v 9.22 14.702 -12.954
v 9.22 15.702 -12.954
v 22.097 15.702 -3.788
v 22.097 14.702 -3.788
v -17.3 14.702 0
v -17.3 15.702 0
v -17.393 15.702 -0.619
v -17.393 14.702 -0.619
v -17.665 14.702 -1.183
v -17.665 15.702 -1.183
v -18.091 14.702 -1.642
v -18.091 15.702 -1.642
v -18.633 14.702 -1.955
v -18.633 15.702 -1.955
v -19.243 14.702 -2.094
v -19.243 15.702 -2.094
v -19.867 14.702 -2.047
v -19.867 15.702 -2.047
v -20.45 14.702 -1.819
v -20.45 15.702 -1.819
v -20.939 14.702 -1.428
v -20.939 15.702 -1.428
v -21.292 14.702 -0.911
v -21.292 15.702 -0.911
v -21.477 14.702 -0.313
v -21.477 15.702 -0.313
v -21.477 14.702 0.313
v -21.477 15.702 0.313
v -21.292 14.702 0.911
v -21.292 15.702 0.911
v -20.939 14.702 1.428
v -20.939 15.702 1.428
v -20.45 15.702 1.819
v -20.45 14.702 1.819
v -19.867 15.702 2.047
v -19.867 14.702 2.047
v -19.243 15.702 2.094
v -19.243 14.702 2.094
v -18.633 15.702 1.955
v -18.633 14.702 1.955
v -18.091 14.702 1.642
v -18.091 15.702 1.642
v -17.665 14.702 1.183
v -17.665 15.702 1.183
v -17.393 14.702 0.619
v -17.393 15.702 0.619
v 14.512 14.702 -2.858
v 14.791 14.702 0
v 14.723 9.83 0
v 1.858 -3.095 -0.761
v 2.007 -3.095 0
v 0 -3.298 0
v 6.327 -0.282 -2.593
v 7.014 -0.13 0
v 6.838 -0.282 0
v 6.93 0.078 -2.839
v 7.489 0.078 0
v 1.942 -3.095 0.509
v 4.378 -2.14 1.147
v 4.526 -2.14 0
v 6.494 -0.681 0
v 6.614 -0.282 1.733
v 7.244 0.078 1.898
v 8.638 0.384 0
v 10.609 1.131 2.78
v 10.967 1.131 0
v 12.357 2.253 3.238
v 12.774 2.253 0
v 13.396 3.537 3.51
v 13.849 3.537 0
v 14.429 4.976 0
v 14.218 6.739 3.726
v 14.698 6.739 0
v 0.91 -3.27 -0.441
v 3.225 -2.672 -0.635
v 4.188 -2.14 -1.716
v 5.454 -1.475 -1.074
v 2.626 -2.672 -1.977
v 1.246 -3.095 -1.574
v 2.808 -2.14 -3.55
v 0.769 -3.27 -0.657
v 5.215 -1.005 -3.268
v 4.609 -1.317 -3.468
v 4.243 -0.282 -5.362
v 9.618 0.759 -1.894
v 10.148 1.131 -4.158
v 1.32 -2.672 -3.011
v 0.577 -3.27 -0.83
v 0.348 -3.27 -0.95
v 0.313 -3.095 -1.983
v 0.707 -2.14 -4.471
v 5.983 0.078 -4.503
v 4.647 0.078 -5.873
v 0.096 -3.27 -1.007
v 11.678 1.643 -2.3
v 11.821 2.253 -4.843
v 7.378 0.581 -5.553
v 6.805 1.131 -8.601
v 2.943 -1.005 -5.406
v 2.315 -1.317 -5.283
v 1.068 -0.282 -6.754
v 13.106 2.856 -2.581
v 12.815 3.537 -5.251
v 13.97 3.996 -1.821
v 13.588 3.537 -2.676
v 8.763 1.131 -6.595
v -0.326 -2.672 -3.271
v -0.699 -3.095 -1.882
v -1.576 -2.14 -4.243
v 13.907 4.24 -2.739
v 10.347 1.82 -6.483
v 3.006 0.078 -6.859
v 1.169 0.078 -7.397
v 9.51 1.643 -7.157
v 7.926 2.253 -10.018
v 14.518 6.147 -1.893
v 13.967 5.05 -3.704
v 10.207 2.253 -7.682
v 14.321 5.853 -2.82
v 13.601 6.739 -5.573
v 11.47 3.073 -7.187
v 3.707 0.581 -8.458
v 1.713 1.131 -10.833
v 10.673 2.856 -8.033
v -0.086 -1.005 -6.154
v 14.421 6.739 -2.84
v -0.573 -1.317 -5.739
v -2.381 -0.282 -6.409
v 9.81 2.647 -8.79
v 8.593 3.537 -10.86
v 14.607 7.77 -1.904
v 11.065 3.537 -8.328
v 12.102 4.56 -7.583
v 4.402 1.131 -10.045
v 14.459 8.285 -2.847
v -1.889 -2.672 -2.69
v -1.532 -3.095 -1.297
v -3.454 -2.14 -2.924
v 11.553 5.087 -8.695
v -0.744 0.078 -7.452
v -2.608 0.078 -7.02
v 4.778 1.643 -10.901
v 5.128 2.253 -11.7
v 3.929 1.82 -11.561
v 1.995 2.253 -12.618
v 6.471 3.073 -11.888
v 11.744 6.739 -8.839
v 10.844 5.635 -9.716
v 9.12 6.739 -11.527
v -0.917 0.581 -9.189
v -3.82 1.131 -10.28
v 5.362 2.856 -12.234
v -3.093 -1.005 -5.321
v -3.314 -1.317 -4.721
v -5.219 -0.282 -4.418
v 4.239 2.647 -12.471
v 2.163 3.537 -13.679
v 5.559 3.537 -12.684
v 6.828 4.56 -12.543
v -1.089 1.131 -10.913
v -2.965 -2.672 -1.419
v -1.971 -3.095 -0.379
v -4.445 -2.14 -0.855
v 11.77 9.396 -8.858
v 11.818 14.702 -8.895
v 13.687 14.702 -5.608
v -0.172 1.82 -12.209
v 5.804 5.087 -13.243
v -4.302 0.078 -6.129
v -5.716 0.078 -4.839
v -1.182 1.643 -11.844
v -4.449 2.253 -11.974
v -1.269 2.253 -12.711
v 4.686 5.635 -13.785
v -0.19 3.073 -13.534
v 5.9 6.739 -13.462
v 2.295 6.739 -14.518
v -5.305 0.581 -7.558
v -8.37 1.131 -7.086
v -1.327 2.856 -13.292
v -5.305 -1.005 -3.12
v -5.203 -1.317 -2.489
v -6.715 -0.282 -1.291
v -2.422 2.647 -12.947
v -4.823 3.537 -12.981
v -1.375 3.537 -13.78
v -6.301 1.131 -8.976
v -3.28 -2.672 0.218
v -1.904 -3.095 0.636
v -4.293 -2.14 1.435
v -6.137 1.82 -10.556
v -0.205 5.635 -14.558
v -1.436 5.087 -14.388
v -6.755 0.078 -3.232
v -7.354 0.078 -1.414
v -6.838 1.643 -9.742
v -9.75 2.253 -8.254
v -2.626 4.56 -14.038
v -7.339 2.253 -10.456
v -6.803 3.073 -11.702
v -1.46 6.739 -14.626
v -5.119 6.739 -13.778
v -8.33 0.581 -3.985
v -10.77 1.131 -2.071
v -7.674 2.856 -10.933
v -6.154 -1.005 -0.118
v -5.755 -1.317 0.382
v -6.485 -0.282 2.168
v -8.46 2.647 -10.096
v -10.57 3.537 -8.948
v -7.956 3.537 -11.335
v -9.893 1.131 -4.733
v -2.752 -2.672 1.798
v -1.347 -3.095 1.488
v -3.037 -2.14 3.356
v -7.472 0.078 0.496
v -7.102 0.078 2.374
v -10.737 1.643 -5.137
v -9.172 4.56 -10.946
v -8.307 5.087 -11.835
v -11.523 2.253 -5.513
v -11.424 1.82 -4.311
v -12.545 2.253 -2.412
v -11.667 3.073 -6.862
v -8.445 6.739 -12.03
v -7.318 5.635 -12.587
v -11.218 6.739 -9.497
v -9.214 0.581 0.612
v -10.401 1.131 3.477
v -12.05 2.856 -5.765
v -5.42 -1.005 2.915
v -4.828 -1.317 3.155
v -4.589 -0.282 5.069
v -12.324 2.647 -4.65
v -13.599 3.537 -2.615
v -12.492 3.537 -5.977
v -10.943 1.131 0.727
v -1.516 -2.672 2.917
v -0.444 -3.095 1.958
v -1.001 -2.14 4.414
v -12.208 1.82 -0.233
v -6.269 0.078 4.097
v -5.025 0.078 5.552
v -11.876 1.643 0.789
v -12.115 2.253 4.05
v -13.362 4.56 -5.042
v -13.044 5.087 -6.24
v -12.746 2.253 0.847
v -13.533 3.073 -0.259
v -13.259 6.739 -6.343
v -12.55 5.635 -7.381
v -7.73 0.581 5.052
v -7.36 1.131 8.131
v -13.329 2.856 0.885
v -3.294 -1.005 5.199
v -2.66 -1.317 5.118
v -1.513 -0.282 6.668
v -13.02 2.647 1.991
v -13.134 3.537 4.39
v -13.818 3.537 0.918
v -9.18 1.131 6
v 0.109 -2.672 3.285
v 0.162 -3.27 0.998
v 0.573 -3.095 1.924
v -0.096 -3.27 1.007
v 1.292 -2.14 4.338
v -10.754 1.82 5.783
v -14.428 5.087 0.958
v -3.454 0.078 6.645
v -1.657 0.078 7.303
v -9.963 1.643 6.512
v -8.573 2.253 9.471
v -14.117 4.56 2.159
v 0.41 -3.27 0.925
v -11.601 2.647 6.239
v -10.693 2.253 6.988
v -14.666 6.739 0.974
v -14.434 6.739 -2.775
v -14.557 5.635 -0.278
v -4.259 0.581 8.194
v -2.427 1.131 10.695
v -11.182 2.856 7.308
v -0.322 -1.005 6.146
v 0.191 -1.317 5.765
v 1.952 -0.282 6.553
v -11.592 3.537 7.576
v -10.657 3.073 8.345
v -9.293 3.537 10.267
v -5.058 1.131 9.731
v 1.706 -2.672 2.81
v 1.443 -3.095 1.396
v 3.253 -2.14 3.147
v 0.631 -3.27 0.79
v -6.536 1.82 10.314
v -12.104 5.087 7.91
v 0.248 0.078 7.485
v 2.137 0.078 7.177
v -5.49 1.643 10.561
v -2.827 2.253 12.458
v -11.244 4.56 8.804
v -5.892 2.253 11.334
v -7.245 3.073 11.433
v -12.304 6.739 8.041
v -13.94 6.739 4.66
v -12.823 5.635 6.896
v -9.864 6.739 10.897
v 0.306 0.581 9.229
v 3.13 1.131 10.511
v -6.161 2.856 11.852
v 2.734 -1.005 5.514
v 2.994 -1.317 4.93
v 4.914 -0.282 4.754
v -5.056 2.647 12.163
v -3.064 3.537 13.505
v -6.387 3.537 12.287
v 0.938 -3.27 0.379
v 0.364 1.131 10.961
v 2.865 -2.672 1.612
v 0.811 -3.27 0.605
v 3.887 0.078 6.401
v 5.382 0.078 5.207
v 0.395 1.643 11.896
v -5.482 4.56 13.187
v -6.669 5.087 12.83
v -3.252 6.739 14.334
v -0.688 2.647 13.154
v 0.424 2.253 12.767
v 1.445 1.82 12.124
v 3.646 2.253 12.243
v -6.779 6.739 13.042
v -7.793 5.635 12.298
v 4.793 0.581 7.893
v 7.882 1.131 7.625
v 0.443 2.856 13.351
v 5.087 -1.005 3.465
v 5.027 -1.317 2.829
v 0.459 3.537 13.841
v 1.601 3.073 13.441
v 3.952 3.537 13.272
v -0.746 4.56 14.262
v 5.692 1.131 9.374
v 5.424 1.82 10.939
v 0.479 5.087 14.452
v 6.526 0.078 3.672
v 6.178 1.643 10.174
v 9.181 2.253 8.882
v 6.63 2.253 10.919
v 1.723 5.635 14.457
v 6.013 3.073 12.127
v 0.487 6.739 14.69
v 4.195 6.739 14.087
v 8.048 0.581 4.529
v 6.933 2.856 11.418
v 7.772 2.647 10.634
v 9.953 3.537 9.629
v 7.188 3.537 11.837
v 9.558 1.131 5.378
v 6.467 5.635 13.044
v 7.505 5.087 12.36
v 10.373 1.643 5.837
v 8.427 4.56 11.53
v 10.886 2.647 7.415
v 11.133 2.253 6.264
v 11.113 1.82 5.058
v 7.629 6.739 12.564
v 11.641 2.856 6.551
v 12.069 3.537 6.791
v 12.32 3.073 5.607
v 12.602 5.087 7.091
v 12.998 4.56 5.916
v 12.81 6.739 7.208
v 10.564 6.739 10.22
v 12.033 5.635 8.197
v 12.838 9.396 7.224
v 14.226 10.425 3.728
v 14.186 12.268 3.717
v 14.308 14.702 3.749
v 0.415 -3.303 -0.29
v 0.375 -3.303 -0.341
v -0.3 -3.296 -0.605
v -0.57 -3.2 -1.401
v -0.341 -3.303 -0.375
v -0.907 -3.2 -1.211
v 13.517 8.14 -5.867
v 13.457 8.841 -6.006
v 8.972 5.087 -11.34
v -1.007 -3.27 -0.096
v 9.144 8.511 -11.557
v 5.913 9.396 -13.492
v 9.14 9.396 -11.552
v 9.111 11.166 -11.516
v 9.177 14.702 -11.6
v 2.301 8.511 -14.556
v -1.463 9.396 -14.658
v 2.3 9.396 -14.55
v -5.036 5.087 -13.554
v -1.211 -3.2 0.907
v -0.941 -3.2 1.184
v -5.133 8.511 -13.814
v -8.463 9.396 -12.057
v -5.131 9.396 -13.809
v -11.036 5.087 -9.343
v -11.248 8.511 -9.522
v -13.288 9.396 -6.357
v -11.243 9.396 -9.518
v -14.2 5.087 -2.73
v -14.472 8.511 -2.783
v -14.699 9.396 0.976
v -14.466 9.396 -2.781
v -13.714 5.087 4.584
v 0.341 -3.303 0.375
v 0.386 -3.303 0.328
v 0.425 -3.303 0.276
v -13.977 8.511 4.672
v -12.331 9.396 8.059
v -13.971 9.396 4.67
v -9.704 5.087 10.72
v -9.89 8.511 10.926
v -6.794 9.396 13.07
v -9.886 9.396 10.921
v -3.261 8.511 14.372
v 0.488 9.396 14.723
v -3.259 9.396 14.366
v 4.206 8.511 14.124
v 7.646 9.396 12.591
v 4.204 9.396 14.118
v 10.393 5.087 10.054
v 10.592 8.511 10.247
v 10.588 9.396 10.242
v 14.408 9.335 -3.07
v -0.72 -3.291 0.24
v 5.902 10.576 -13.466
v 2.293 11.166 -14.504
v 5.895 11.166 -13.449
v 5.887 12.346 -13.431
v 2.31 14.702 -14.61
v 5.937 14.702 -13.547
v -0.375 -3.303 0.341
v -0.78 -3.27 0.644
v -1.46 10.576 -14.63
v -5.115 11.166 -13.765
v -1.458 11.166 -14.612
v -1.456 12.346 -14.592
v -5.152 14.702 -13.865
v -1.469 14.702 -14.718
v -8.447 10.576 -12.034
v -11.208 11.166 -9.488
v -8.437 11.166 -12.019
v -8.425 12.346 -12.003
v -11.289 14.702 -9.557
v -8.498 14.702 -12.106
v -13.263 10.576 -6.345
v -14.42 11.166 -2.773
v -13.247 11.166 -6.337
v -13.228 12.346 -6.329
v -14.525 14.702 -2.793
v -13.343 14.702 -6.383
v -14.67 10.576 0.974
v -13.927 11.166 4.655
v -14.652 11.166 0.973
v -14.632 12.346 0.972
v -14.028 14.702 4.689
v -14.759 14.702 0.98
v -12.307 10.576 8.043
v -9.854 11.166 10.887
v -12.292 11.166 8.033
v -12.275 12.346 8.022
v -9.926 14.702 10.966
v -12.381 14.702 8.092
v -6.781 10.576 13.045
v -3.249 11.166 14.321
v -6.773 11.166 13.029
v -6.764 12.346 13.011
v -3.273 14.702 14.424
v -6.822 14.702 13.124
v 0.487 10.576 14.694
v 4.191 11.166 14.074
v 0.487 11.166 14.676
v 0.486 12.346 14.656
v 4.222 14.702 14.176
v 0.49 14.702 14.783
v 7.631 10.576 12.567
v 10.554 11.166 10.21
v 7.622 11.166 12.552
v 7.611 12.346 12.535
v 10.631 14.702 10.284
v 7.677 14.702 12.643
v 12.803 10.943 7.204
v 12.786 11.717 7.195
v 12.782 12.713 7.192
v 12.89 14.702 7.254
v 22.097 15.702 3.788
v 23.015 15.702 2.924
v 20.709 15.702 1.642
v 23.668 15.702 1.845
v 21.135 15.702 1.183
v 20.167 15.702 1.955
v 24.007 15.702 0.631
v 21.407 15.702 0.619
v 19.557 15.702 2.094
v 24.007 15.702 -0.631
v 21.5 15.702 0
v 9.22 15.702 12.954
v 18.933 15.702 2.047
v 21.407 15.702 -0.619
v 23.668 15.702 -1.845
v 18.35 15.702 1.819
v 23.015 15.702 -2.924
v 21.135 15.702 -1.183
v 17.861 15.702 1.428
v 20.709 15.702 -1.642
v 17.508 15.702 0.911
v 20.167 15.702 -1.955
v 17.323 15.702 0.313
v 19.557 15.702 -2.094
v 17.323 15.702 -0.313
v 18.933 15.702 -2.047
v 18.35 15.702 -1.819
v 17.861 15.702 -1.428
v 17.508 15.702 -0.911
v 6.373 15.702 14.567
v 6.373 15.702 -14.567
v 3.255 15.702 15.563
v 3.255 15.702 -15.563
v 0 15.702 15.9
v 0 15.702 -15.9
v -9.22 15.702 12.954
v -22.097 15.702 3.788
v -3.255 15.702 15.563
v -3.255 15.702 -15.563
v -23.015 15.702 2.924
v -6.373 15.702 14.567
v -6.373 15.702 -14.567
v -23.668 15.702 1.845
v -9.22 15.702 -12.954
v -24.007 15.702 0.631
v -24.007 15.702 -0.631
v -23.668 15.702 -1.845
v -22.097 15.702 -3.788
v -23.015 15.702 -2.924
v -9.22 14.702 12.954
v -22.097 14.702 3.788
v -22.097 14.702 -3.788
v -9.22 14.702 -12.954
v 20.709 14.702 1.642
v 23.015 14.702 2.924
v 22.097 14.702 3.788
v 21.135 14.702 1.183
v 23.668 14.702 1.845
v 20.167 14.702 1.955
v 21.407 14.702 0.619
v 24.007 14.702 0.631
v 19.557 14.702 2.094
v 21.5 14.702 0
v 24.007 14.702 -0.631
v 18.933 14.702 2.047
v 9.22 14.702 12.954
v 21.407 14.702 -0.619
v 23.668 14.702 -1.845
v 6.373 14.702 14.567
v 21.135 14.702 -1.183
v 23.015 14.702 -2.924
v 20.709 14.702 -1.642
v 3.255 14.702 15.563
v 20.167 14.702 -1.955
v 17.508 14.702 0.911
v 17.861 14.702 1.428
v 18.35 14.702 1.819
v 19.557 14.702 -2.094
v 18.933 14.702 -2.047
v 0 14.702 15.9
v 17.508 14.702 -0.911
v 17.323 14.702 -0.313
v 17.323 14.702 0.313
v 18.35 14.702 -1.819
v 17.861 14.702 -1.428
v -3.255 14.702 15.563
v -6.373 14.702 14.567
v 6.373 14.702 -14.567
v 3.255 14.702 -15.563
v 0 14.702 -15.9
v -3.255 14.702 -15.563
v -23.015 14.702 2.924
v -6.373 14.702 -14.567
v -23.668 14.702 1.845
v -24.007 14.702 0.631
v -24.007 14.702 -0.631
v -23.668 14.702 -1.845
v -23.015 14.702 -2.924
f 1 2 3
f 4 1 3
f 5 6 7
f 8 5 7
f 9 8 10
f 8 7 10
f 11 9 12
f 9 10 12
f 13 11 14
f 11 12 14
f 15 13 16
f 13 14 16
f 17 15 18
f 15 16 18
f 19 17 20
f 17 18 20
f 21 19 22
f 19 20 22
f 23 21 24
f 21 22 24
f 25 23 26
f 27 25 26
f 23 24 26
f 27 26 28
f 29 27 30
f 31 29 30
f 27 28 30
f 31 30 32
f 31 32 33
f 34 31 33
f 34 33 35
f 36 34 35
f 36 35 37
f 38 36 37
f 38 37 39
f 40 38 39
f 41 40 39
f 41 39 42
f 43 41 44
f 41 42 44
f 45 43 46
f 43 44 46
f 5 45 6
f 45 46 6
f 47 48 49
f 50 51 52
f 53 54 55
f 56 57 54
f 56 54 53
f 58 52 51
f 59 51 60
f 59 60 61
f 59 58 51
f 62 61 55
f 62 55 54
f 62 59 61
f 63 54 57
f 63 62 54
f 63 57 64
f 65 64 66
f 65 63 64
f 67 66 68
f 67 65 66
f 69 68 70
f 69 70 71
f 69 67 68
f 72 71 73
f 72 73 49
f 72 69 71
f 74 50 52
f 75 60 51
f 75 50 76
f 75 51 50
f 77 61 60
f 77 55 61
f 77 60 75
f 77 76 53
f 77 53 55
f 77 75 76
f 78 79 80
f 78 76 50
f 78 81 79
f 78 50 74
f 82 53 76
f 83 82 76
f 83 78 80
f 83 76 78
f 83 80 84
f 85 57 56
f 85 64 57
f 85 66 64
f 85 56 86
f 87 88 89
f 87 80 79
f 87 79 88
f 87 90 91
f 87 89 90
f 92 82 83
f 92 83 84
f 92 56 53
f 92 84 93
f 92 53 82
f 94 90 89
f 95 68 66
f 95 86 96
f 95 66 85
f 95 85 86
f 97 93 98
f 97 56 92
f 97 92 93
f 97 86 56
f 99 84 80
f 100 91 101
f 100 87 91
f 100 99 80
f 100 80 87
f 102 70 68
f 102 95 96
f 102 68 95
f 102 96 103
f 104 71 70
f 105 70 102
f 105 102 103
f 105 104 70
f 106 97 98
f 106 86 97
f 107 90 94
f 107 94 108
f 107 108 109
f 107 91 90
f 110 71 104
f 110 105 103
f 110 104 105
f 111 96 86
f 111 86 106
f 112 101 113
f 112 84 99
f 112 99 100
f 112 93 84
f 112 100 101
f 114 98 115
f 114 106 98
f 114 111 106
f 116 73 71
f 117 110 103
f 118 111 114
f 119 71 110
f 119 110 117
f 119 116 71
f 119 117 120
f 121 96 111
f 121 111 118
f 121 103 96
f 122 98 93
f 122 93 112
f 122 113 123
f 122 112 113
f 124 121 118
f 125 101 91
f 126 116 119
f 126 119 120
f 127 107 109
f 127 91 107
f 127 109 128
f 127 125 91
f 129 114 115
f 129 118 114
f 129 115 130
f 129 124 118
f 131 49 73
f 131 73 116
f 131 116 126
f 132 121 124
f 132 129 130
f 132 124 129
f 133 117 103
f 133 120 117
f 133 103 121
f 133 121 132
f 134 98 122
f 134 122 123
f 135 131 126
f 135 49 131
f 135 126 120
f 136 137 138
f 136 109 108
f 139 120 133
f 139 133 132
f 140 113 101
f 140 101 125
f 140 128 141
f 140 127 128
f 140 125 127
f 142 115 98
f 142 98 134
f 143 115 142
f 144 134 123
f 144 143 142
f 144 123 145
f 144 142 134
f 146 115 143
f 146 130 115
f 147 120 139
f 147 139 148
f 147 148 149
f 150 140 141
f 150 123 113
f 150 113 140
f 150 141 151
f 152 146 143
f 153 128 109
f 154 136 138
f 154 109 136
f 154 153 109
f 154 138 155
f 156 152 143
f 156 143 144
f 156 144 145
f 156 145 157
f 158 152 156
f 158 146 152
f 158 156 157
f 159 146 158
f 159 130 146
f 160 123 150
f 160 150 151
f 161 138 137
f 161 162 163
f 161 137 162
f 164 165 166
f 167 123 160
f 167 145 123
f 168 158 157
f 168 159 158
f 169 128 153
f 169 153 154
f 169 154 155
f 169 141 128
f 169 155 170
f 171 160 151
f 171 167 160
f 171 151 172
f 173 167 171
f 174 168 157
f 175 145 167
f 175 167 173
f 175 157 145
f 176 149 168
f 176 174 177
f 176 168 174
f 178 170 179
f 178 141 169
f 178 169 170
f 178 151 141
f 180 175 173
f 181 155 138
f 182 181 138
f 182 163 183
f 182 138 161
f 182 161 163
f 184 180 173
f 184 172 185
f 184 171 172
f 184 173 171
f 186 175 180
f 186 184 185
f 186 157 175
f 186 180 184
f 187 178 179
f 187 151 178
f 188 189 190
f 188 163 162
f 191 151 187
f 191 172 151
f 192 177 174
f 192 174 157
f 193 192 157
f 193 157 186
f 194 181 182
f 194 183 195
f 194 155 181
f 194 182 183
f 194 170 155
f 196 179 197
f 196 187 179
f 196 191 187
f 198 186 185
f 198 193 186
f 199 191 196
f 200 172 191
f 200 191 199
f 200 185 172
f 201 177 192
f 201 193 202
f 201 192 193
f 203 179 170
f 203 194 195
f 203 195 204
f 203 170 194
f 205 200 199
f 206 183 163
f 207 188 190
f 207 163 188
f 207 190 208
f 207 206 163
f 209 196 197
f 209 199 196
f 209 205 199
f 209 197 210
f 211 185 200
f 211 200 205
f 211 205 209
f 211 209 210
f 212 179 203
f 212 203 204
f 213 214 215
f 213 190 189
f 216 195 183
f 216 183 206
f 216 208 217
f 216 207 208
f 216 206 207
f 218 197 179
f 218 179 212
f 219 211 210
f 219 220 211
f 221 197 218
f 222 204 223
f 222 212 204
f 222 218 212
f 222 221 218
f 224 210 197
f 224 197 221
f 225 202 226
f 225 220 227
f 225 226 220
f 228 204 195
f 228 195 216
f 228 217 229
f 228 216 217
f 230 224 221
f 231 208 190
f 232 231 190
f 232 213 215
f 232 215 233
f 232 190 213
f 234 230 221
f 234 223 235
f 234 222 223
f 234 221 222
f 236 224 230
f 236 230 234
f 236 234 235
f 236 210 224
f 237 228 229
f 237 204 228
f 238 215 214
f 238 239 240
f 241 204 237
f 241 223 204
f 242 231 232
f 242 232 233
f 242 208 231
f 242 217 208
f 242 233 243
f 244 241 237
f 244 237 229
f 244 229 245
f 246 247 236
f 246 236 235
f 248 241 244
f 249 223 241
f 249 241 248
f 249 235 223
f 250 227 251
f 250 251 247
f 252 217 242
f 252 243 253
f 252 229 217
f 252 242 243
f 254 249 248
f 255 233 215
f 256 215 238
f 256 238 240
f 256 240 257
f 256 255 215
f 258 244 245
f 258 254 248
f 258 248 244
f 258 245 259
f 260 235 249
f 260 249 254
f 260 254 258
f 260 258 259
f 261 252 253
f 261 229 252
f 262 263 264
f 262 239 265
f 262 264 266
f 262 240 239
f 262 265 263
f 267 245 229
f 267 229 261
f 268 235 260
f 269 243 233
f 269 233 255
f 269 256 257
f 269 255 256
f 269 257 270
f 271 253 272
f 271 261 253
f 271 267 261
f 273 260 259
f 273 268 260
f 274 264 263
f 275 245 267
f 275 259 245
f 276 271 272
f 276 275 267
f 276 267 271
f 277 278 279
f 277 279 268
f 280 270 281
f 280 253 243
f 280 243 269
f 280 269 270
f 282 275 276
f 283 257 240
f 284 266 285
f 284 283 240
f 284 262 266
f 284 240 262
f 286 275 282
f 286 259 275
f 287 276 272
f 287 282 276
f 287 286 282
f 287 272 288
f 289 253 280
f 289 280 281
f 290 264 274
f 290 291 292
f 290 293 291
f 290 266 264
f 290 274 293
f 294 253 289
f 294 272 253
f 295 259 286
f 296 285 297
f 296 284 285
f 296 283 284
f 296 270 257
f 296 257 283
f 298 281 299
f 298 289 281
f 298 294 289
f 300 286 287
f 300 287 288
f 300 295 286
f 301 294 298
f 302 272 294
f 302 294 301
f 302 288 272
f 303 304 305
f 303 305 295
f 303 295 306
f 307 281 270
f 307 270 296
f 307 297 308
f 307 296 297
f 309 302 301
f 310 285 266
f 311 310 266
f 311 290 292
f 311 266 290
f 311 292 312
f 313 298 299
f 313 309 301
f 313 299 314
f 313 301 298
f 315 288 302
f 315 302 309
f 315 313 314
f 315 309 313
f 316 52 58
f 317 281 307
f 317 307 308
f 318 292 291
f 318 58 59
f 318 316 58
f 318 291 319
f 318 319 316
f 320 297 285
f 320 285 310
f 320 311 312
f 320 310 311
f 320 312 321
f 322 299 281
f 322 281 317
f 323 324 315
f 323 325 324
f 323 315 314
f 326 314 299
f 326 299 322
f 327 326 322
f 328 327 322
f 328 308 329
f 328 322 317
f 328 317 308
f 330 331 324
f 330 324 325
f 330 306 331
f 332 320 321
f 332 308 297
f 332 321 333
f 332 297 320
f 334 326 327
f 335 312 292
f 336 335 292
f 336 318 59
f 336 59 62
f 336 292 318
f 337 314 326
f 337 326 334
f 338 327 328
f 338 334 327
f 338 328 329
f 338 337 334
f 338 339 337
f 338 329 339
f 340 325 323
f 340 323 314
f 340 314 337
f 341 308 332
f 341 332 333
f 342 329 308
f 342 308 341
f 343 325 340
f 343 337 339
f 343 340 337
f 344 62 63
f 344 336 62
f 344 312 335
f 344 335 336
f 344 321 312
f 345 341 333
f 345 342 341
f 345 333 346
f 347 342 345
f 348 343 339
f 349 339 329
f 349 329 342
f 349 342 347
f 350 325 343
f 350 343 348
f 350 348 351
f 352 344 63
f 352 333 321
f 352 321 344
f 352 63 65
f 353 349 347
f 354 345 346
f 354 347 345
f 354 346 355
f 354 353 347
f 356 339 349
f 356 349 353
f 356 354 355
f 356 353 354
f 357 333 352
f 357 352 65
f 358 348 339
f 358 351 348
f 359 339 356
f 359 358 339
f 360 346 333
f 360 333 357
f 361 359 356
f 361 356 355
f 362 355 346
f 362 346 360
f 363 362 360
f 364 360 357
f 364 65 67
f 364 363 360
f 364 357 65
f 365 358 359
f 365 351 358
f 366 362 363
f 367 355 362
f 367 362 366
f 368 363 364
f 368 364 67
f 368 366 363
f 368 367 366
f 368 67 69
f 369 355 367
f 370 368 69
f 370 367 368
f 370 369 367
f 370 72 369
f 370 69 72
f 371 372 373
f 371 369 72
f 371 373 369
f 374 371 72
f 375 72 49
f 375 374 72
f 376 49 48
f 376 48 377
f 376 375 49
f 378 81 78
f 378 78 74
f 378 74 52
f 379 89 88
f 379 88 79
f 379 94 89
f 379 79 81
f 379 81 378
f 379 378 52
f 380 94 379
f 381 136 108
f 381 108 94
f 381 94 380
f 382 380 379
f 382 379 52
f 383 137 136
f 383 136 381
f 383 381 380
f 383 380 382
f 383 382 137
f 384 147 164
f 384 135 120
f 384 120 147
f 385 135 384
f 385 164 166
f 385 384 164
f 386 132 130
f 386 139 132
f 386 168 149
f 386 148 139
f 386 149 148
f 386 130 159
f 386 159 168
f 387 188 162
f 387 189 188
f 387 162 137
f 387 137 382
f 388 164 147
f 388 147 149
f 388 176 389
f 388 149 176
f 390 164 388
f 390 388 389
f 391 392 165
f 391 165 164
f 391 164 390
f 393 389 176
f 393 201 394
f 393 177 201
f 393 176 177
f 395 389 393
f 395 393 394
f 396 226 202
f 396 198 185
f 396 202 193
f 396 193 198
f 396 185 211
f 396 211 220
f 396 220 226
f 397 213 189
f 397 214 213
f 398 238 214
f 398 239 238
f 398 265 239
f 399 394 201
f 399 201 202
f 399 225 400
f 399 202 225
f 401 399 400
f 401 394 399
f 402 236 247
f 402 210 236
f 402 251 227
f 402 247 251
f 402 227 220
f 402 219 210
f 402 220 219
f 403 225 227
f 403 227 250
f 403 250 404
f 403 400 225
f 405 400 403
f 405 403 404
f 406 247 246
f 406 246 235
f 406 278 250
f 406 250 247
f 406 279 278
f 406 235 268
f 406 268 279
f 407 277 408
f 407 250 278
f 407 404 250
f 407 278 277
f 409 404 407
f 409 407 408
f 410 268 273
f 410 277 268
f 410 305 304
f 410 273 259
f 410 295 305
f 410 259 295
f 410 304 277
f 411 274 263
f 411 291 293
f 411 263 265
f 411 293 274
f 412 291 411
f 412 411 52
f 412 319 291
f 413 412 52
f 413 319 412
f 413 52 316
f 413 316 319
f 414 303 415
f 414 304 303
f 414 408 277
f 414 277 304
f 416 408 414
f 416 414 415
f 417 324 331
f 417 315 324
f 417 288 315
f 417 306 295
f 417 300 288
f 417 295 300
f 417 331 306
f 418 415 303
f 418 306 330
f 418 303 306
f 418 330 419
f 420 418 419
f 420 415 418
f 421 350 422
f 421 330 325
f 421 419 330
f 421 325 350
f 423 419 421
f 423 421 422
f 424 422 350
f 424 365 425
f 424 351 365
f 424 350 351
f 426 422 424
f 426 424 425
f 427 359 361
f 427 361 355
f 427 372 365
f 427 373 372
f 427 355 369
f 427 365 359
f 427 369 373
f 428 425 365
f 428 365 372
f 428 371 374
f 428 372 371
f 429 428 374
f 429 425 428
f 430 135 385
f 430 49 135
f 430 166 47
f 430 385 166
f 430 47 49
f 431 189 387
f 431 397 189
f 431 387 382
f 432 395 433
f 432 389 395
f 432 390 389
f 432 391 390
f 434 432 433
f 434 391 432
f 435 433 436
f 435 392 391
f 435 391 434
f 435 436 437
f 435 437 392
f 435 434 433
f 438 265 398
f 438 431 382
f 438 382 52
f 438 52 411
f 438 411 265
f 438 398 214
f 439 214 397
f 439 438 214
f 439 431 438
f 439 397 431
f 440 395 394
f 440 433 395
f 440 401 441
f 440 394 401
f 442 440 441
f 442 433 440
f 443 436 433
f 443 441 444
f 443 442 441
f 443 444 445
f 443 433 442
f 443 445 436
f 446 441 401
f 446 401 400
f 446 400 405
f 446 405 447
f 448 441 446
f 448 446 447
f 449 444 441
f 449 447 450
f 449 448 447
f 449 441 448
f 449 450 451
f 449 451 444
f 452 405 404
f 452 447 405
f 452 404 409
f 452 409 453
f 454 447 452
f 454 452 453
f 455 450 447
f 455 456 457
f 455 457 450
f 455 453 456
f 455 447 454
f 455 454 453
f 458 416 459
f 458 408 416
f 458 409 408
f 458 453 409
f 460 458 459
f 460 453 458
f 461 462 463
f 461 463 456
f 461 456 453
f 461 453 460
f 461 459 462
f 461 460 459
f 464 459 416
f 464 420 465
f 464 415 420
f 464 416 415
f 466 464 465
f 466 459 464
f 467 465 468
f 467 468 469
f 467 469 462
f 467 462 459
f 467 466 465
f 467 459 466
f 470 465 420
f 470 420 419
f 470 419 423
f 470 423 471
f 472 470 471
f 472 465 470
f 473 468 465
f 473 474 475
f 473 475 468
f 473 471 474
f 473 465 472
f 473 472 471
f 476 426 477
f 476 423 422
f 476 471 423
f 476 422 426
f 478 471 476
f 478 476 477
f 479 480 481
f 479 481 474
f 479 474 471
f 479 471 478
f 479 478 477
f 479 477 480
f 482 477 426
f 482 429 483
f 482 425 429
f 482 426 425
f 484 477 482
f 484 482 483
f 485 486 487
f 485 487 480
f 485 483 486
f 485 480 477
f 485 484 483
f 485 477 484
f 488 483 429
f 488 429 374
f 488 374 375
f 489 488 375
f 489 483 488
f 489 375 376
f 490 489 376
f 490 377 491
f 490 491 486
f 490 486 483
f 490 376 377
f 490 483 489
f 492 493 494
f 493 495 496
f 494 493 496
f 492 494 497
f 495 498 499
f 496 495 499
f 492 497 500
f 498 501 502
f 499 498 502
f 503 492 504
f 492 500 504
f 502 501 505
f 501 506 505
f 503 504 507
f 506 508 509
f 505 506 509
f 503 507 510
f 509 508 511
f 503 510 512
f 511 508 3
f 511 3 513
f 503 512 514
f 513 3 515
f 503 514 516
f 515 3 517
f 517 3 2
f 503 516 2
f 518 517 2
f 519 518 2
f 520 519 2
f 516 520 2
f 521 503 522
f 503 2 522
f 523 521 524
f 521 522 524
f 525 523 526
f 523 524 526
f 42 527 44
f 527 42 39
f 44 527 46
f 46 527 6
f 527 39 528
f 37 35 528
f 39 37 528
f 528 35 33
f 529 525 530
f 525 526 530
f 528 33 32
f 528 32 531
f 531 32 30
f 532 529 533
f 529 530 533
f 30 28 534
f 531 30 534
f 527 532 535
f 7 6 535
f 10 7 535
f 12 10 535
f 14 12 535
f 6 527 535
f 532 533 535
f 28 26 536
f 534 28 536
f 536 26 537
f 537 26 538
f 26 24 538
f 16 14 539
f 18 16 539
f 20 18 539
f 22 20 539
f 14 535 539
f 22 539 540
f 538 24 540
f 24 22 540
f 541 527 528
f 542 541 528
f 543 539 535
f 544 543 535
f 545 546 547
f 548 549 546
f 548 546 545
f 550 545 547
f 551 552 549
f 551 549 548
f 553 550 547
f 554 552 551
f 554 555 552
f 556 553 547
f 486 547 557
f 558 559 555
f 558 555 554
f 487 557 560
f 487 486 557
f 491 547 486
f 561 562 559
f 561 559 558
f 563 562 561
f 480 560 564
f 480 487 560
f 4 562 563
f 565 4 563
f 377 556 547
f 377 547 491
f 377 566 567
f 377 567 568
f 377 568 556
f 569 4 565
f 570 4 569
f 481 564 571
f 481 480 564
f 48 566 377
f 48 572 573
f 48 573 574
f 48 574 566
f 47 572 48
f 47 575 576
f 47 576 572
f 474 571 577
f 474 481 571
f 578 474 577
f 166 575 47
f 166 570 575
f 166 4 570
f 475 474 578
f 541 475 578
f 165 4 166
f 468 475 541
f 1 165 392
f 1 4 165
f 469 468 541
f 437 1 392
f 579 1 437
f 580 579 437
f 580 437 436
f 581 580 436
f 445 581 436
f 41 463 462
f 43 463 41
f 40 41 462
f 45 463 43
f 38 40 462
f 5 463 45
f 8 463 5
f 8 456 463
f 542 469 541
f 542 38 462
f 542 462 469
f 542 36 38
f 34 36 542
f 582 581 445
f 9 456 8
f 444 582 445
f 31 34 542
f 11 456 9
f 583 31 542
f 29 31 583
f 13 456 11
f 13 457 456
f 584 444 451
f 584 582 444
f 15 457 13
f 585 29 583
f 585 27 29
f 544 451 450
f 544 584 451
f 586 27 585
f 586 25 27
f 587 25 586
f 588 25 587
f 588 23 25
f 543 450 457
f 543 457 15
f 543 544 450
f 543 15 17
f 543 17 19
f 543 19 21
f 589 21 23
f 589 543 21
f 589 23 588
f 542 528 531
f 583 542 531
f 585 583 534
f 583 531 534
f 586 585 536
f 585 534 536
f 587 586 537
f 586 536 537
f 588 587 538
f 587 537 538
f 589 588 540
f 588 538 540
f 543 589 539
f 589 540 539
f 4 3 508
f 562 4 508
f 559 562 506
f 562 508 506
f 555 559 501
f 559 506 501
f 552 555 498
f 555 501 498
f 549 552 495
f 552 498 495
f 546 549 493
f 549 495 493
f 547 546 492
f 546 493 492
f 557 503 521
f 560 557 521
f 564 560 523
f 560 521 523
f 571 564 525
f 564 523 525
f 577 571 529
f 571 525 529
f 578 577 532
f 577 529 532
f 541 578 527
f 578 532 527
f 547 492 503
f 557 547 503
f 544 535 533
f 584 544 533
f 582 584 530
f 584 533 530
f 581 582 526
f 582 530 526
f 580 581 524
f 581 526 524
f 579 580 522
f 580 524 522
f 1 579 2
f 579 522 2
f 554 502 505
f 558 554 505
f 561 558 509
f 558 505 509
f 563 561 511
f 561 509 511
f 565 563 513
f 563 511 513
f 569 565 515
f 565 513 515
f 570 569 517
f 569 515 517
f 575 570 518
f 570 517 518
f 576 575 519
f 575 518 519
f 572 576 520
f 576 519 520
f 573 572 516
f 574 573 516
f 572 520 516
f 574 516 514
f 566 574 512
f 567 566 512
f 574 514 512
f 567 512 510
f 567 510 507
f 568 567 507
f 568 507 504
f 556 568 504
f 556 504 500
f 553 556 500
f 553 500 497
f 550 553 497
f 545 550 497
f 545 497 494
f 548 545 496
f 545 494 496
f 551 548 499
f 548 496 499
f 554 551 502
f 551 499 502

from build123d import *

# Parameters (mm, degrees)
SKETCH_2_R      = 2.1
EXTRUDE_1_DEPTH = 1


with BuildPart() as part:
    # 草图1 → 旋转1 (revolve)
    with BuildSketch(Plane.XY):
        with BuildLine():
            Line((14.944585174, 15.701905636), (0, 15.701905636))
            Line((0, 15.701905636), (0, -3.298094364))
            add(Edge.make_bspline(
                [(0, -3.298094364), (0.706455528, -3.332616299), (1.691072276, -3.219064863), (2.773175522, -2.870028275), (3.305020932, -2.665292125), (3.682415706, -2.517038895), (4.050641345, -2.355189766), (4.416695399, -2.20481684), (4.77817462, -2.003706717), (5.099926424, -1.754542973), (5.469244366, -1.550129904), (5.861768452, -1.245065409), (6.265016456, -0.923290365), (6.630974372, -0.544071897), (6.924875069, -0.139959882), (7.370604687, 0.048686033), (7.772218261, 0.161143877), (8.158981876, 0.24790247), (8.578399204, 0.358534367), (9.10951982, 0.547037122), (9.69818302, 0.72066457), (10.259773085, 0.91104592), (10.747610732, 1.028094825), (11.160281011, 1.214814977), (11.564815316, 1.481178609), (12.000197559, 1.680416472), (12.456348878, 1.97889325), (12.887671936, 2.339764988), (13.291414369, 2.770380198), (13.622058348, 3.171561468), (13.87545394, 3.574212032), (14.104629888, 3.983119622), (14.24807752, 4.50808303), (14.453255803, 4.977984441), (14.55328951, 5.613547364), (14.688797752, 6.352898821), (14.744580933, 7.850347198), (14.739662401, 9.917386792), (14.610748365, 12.725417472), (14.745577946, 14.655065366), (14.944585174, 15.701905636)],
                knots=[0, 0, 0, 0, 0.074980327, 0.104145363, 0.120682551, 0.135565386, 0.147239076, 0.163438876, 0.177614949, 0.191043322, 0.206610736, 0.222342481, 0.243822524, 0.261329251, 0.278460385, 0.295787667, 0.311179453, 0.323053348, 0.337863831, 0.357273022, 0.382918323, 0.403098398, 0.420289185, 0.436132056, 0.450933537, 0.471701704, 0.4868637, 0.508750883, 0.531302671, 0.549552014, 0.563884853, 0.581874699, 0.599060538, 0.621525796, 0.636019375, 0.667207468, 0.701413253, 0.794955071, 0.88706401, 1, 1, 1, 1], degree=3))
        make_face()
    revolve(axis=Axis((0, -3.298094364, 0), (0, 1, 0)))

    # 草图2 → 凸台-拉伸1 (add)
    with BuildSketch(Plane(origin=(0, 15.701905636, 0), x_dir=(1, 0, 0), z_dir=(0, 1, 0))):
        with BuildLine():
            Line((9.220360825, 12.953568862), (22.096520619, 3.788307875))
            ThreePointArc((22.096520619, 3.788307875), (24.05, 0), (22.096520619, -3.788307875))
            Line((22.096520619, -3.788307875), (9.220360825, -12.953568862))
            ThreePointArc((9.220360825, -12.953568862), (0, -15.9), (-9.220360825, -12.953568862))
            Line((-9.220360825, -12.953568862), (-22.096520619, -3.788307875))
            ThreePointArc((-22.096520619, -3.788307875), (-24.05, 0), (-22.096520619, 3.788307875))
            Line((-22.096520619, 3.788307875), (-9.220360825, 12.953568862))
            ThreePointArc((-9.220360825, 12.953568862), (0, 15.9), (9.220360825, 12.953568862))
        make_face()
        with Locations((19.4, 0)):
            Circle(SKETCH_2_R, mode=Mode.SUBTRACT)
        with Locations((-19.4, 0)):
            Circle(SKETCH_2_R, mode=Mode.SUBTRACT)
    extrude(amount=-EXTRUDE_1_DEPTH)


solid = part.part
